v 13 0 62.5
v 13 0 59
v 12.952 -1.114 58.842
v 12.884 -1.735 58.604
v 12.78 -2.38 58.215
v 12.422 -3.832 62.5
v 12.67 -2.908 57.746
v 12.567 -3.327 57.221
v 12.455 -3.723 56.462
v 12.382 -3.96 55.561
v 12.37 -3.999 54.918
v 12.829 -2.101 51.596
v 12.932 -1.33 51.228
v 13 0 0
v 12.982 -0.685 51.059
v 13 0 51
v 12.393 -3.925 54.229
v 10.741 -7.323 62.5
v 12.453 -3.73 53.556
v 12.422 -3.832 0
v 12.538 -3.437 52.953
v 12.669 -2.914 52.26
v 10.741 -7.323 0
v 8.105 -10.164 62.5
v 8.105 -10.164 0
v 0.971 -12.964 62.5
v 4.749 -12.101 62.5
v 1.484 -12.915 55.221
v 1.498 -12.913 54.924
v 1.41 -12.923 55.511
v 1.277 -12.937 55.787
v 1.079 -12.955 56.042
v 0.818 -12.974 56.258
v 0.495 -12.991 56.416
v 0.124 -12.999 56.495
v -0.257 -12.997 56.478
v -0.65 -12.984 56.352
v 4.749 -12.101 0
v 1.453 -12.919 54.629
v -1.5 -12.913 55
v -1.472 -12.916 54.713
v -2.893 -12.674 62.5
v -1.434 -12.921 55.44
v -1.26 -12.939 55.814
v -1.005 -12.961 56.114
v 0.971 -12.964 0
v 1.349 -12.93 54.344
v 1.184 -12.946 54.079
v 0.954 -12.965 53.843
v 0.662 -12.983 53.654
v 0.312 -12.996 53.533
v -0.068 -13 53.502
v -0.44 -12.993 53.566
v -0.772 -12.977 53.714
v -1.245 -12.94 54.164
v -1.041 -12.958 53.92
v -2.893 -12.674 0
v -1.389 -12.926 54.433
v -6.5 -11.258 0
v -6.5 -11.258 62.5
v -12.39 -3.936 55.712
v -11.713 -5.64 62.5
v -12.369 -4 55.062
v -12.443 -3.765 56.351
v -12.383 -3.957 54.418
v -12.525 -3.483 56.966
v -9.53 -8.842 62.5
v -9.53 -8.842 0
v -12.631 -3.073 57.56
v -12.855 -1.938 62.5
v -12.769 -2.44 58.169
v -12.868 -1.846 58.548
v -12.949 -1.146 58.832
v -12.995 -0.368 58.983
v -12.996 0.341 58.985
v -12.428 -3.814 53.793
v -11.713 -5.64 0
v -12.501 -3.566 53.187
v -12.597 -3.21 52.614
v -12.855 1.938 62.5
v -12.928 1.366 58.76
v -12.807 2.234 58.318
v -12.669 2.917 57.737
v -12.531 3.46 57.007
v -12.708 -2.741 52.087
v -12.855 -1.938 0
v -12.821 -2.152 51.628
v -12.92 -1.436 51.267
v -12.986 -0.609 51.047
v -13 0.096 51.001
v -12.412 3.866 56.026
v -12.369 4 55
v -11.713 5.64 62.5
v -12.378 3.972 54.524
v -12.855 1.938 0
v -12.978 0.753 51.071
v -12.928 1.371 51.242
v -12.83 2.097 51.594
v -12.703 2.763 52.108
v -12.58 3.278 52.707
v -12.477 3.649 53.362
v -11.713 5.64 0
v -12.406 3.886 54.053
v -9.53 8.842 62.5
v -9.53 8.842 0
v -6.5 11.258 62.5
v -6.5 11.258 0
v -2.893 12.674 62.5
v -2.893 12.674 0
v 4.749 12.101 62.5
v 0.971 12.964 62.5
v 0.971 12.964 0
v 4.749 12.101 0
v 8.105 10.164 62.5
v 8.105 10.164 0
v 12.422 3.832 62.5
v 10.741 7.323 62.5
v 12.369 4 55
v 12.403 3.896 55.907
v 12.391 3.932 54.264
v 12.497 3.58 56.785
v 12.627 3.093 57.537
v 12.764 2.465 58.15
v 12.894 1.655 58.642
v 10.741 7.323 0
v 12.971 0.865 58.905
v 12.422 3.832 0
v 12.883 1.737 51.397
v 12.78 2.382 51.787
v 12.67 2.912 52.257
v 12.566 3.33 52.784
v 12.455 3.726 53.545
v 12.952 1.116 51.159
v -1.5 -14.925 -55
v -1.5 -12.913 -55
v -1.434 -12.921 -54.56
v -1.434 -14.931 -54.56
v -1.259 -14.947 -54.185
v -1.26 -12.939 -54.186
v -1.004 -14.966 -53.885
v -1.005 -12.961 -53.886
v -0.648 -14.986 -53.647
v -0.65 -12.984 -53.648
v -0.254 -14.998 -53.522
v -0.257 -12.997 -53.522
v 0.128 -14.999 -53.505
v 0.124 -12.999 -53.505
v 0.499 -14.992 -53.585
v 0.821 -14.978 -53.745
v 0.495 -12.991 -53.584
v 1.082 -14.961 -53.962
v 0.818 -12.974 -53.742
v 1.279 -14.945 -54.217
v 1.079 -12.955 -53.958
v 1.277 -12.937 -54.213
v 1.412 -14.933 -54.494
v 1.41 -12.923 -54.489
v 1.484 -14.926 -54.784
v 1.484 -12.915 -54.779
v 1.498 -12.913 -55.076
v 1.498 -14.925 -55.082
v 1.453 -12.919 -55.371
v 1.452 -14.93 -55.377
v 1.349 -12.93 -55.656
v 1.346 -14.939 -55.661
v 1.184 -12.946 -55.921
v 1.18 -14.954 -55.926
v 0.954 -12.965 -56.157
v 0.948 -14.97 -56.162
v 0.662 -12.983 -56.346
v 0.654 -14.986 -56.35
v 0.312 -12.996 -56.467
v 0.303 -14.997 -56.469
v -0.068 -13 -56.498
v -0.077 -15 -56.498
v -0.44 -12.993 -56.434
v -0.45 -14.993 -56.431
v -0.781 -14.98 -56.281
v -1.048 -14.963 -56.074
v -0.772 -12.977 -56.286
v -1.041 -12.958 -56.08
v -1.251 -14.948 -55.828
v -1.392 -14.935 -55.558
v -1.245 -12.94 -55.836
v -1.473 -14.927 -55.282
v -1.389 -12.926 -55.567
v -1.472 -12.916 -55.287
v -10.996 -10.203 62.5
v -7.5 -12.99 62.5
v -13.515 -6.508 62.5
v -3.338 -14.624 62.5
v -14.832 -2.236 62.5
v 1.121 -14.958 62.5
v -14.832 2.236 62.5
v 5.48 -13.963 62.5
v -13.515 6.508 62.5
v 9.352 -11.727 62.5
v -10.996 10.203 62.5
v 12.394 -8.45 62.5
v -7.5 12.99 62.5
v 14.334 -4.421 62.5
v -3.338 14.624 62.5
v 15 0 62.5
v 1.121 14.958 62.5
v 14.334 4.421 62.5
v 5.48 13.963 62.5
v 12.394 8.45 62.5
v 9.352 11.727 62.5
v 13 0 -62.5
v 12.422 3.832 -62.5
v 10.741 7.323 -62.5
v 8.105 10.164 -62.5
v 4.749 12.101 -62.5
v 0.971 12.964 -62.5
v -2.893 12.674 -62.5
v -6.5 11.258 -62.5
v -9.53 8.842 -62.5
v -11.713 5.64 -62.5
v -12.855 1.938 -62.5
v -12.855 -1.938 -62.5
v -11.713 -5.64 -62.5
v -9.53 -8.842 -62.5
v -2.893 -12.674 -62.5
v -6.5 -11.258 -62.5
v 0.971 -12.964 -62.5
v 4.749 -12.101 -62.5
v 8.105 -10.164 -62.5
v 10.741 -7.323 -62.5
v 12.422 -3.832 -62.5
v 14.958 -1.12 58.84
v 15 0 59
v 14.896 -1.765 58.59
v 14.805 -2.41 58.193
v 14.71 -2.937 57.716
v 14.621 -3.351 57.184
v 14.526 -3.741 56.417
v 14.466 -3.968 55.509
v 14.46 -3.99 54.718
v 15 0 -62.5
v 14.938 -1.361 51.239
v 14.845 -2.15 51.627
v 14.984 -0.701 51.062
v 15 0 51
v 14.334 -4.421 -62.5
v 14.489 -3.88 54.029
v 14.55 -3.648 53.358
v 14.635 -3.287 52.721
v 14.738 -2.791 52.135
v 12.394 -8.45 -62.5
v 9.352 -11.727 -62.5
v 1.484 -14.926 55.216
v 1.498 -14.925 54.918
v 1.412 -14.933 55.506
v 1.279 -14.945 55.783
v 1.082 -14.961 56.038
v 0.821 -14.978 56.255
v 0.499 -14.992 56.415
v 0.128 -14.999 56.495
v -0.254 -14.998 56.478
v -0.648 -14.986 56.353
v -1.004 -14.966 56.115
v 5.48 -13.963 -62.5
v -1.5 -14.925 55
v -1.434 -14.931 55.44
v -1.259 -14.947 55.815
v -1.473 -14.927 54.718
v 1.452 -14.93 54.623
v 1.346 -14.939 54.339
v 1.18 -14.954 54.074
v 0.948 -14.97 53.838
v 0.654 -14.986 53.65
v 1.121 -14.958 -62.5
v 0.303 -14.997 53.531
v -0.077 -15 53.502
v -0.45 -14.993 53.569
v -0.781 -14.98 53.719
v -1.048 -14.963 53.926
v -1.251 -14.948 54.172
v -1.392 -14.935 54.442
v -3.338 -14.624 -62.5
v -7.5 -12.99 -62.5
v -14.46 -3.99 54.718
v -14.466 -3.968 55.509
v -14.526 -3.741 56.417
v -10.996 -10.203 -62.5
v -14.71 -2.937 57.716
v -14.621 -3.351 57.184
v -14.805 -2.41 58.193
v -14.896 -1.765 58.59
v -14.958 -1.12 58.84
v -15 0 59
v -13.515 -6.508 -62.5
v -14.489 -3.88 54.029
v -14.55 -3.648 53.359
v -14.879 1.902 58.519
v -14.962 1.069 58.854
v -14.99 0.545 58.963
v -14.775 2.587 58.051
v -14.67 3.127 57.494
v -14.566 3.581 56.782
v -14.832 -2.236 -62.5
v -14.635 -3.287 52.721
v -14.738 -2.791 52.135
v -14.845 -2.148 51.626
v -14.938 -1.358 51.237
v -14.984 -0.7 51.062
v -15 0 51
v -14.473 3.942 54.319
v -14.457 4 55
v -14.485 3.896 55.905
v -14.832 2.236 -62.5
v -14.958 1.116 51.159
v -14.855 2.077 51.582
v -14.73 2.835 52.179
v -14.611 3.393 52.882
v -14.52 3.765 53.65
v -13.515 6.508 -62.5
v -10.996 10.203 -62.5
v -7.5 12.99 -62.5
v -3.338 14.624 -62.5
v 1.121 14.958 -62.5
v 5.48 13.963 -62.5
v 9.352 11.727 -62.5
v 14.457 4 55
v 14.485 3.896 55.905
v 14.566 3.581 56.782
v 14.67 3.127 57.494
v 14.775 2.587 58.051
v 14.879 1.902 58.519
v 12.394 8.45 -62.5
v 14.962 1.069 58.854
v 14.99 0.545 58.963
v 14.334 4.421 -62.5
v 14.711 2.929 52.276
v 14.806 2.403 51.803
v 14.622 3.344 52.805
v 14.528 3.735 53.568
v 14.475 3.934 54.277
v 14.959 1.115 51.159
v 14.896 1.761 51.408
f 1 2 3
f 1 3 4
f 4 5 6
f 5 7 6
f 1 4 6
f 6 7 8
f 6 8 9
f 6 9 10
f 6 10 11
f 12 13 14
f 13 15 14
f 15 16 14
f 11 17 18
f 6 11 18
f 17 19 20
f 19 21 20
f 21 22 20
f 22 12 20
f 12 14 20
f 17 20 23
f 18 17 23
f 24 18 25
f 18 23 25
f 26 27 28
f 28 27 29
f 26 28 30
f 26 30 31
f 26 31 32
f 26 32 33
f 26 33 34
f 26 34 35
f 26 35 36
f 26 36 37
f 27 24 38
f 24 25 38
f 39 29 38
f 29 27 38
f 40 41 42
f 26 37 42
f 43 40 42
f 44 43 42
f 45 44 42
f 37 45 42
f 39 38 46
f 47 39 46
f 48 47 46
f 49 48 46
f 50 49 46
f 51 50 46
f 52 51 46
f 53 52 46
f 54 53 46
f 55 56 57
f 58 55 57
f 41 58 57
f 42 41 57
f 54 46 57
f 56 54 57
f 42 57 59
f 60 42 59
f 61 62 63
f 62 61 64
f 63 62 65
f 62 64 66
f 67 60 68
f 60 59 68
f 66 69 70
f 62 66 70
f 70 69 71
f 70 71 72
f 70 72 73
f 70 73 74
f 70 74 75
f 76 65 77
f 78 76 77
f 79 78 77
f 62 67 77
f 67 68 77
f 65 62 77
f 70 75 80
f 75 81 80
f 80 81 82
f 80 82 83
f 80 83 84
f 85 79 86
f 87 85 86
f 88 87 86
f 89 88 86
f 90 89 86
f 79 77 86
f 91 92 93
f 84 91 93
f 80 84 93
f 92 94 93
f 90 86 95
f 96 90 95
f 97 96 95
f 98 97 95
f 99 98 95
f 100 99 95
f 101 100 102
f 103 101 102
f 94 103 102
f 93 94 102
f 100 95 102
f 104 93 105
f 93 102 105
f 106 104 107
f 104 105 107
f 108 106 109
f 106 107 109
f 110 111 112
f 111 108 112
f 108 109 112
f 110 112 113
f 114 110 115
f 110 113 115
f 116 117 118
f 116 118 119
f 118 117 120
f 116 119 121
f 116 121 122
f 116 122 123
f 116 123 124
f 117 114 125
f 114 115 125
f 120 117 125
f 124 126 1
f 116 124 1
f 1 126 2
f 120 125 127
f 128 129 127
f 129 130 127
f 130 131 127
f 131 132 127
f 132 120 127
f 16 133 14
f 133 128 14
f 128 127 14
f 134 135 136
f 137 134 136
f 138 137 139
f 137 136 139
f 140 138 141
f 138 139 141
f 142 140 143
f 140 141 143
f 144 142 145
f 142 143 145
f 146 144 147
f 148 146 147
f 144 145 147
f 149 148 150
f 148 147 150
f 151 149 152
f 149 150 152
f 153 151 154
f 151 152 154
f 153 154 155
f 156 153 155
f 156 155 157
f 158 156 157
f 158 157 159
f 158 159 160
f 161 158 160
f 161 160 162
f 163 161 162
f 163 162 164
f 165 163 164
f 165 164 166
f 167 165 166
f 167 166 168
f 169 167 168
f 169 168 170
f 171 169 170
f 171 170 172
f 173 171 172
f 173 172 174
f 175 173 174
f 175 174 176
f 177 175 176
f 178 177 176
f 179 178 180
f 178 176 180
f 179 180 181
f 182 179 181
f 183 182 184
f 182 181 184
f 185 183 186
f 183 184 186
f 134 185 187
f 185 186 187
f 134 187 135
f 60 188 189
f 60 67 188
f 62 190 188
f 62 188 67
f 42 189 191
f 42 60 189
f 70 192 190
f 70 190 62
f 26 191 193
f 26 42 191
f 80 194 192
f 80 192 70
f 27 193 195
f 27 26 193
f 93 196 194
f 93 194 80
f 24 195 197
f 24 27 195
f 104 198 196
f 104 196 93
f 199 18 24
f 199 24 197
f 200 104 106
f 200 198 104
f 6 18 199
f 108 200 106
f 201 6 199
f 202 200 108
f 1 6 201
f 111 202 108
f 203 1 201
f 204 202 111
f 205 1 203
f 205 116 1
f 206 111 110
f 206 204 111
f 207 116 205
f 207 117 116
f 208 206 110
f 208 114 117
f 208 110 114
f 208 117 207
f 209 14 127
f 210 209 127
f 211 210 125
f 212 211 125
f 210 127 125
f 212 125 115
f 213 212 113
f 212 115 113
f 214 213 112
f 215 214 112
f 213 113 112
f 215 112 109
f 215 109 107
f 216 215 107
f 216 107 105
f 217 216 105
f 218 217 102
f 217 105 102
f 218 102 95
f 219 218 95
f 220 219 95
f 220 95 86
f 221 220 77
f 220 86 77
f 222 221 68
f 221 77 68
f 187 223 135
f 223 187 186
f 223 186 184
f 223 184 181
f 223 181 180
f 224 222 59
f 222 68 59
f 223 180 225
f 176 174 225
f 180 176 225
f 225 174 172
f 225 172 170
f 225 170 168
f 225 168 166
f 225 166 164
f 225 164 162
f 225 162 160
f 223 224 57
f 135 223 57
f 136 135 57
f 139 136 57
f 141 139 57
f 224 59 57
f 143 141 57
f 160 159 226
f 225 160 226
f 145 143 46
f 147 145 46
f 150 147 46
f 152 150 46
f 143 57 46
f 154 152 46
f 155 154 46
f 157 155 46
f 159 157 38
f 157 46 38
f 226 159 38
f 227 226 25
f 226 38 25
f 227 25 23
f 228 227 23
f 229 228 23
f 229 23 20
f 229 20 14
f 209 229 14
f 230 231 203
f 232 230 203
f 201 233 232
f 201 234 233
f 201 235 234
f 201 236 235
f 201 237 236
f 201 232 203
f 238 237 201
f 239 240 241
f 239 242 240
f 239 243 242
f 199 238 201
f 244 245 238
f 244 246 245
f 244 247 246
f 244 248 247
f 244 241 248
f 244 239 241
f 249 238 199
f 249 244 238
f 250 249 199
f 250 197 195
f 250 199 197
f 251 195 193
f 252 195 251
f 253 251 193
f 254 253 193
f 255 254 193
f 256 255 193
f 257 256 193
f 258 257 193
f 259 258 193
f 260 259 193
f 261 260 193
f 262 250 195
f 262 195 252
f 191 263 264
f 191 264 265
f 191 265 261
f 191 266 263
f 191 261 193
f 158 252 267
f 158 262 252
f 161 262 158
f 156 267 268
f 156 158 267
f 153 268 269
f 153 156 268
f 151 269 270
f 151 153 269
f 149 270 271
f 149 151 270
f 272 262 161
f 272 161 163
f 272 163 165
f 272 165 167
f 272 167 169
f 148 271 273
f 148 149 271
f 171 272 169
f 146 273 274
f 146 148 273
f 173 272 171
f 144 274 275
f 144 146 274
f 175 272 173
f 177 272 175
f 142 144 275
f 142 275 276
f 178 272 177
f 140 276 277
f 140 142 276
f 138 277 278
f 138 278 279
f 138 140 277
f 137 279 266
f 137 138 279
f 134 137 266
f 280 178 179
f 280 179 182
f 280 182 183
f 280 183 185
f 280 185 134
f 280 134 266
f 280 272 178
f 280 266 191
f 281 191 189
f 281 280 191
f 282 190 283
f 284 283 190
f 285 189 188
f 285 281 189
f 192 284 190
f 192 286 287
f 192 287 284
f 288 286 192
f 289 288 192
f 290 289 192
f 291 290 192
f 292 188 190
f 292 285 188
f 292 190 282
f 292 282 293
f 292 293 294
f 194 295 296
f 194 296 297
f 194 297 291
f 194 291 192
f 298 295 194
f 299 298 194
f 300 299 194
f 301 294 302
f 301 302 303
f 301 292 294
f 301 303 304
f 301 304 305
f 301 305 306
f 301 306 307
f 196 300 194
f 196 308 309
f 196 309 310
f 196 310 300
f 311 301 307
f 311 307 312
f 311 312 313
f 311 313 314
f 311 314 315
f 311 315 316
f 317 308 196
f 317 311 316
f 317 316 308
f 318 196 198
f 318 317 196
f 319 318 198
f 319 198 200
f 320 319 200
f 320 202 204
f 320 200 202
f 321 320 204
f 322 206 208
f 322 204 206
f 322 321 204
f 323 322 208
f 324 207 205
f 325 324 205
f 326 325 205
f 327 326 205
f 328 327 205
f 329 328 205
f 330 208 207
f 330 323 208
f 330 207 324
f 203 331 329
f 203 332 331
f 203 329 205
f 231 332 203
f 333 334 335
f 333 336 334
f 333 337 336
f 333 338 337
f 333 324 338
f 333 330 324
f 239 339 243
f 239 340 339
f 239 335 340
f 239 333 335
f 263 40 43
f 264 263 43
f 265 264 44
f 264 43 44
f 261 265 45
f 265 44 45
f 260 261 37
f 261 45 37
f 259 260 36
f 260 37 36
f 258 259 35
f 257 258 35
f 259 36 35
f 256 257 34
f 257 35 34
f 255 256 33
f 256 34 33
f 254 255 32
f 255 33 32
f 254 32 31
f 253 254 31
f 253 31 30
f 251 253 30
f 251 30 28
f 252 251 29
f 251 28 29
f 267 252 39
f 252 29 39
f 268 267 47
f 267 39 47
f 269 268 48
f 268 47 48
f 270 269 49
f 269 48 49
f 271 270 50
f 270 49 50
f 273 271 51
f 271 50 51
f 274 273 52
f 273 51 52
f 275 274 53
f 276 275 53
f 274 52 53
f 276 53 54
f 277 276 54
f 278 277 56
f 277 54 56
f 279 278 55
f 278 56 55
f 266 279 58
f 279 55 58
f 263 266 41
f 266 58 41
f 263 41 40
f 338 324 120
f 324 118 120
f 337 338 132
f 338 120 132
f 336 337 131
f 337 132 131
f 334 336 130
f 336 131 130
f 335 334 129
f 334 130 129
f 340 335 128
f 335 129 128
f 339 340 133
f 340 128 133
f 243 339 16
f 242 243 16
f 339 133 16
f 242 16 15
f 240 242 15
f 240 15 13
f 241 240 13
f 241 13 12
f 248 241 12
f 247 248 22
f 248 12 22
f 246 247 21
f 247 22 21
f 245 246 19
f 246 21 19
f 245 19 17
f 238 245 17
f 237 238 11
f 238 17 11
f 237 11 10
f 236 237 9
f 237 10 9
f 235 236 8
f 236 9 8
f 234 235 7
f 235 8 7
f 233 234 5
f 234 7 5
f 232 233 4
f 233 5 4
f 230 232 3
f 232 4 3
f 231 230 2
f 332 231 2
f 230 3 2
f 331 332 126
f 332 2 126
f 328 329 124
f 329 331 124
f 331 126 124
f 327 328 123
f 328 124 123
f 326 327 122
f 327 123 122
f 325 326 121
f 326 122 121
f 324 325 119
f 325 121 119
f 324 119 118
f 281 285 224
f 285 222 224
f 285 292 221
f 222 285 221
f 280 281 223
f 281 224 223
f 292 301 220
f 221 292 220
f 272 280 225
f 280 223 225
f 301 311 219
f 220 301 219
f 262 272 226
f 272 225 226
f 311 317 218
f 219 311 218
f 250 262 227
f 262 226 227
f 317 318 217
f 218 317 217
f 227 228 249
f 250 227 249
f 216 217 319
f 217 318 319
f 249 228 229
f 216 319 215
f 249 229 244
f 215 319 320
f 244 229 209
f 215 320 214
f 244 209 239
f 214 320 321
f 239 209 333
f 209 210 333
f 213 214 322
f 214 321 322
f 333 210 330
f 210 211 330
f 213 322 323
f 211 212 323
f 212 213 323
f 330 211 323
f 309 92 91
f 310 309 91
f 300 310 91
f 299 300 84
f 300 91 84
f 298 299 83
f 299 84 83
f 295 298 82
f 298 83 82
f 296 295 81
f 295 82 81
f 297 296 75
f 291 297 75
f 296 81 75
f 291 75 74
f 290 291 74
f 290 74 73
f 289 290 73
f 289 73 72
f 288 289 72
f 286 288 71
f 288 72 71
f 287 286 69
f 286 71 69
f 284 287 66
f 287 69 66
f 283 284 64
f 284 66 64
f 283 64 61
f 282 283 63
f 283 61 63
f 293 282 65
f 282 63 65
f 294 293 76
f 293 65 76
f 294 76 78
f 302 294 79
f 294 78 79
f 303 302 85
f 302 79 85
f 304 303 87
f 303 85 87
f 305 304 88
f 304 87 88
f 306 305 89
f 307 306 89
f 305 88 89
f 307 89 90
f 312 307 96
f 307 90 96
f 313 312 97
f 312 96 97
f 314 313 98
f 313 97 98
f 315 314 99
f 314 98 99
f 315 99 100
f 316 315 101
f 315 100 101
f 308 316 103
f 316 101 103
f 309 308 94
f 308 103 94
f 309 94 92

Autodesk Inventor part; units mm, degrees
ref_plane "YZ Plane" through (0, 0, 0) normal (1, 0, 0) x (0, 1, 0)
ref_plane "XZ Plane" through (0, 0, 0) normal (0, 1, 0) x (-1, 0, 0)
ref_plane "XY Plane" through (0, 0, 0) normal (0, 0, 1) x (1, 0, 0)
sketch "Szkic1" plane through (0, 0, 0) normal (0, 0, 1) x (1, 0, 0)
  circle A0 centre (0, 0) radius 15
  circle A1 centre (0, 0) radius 13
  dimension "d0" = 30
  dimension "d2" = 2
extrude "Wyciągnięcie proste1" add sketch "Szkic1" along normal mid plane 125
sketch "Szkic5" plane through (0, 0, 0) normal (0, 1, 0) x (-1, 0, 0)
  circle A0 centre (0, 55) radius 1.5
  circle A1 centre (0, -55) radius 1.5
  point P0 (0, 0)
  dimension "d40" = 3
  dimension "d41" = 3
extrude "Wyciągnięcie proste6" cut sketch "Szkic5" against normal blind 20
sketch "Szkic6" plane through (0, 0, 0) normal (1, 0, 0) x (0, 1, 0)
  circle A0 centre (0, 55) radius 4
  point P0 (0, 0)
  dimension "d44" = 8
extrude "Wyciągnięcie proste7" cut sketch "Szkic6" along normal mid plane 30
properties part number "rura_30_2_250" material "Aluminium 6061"
